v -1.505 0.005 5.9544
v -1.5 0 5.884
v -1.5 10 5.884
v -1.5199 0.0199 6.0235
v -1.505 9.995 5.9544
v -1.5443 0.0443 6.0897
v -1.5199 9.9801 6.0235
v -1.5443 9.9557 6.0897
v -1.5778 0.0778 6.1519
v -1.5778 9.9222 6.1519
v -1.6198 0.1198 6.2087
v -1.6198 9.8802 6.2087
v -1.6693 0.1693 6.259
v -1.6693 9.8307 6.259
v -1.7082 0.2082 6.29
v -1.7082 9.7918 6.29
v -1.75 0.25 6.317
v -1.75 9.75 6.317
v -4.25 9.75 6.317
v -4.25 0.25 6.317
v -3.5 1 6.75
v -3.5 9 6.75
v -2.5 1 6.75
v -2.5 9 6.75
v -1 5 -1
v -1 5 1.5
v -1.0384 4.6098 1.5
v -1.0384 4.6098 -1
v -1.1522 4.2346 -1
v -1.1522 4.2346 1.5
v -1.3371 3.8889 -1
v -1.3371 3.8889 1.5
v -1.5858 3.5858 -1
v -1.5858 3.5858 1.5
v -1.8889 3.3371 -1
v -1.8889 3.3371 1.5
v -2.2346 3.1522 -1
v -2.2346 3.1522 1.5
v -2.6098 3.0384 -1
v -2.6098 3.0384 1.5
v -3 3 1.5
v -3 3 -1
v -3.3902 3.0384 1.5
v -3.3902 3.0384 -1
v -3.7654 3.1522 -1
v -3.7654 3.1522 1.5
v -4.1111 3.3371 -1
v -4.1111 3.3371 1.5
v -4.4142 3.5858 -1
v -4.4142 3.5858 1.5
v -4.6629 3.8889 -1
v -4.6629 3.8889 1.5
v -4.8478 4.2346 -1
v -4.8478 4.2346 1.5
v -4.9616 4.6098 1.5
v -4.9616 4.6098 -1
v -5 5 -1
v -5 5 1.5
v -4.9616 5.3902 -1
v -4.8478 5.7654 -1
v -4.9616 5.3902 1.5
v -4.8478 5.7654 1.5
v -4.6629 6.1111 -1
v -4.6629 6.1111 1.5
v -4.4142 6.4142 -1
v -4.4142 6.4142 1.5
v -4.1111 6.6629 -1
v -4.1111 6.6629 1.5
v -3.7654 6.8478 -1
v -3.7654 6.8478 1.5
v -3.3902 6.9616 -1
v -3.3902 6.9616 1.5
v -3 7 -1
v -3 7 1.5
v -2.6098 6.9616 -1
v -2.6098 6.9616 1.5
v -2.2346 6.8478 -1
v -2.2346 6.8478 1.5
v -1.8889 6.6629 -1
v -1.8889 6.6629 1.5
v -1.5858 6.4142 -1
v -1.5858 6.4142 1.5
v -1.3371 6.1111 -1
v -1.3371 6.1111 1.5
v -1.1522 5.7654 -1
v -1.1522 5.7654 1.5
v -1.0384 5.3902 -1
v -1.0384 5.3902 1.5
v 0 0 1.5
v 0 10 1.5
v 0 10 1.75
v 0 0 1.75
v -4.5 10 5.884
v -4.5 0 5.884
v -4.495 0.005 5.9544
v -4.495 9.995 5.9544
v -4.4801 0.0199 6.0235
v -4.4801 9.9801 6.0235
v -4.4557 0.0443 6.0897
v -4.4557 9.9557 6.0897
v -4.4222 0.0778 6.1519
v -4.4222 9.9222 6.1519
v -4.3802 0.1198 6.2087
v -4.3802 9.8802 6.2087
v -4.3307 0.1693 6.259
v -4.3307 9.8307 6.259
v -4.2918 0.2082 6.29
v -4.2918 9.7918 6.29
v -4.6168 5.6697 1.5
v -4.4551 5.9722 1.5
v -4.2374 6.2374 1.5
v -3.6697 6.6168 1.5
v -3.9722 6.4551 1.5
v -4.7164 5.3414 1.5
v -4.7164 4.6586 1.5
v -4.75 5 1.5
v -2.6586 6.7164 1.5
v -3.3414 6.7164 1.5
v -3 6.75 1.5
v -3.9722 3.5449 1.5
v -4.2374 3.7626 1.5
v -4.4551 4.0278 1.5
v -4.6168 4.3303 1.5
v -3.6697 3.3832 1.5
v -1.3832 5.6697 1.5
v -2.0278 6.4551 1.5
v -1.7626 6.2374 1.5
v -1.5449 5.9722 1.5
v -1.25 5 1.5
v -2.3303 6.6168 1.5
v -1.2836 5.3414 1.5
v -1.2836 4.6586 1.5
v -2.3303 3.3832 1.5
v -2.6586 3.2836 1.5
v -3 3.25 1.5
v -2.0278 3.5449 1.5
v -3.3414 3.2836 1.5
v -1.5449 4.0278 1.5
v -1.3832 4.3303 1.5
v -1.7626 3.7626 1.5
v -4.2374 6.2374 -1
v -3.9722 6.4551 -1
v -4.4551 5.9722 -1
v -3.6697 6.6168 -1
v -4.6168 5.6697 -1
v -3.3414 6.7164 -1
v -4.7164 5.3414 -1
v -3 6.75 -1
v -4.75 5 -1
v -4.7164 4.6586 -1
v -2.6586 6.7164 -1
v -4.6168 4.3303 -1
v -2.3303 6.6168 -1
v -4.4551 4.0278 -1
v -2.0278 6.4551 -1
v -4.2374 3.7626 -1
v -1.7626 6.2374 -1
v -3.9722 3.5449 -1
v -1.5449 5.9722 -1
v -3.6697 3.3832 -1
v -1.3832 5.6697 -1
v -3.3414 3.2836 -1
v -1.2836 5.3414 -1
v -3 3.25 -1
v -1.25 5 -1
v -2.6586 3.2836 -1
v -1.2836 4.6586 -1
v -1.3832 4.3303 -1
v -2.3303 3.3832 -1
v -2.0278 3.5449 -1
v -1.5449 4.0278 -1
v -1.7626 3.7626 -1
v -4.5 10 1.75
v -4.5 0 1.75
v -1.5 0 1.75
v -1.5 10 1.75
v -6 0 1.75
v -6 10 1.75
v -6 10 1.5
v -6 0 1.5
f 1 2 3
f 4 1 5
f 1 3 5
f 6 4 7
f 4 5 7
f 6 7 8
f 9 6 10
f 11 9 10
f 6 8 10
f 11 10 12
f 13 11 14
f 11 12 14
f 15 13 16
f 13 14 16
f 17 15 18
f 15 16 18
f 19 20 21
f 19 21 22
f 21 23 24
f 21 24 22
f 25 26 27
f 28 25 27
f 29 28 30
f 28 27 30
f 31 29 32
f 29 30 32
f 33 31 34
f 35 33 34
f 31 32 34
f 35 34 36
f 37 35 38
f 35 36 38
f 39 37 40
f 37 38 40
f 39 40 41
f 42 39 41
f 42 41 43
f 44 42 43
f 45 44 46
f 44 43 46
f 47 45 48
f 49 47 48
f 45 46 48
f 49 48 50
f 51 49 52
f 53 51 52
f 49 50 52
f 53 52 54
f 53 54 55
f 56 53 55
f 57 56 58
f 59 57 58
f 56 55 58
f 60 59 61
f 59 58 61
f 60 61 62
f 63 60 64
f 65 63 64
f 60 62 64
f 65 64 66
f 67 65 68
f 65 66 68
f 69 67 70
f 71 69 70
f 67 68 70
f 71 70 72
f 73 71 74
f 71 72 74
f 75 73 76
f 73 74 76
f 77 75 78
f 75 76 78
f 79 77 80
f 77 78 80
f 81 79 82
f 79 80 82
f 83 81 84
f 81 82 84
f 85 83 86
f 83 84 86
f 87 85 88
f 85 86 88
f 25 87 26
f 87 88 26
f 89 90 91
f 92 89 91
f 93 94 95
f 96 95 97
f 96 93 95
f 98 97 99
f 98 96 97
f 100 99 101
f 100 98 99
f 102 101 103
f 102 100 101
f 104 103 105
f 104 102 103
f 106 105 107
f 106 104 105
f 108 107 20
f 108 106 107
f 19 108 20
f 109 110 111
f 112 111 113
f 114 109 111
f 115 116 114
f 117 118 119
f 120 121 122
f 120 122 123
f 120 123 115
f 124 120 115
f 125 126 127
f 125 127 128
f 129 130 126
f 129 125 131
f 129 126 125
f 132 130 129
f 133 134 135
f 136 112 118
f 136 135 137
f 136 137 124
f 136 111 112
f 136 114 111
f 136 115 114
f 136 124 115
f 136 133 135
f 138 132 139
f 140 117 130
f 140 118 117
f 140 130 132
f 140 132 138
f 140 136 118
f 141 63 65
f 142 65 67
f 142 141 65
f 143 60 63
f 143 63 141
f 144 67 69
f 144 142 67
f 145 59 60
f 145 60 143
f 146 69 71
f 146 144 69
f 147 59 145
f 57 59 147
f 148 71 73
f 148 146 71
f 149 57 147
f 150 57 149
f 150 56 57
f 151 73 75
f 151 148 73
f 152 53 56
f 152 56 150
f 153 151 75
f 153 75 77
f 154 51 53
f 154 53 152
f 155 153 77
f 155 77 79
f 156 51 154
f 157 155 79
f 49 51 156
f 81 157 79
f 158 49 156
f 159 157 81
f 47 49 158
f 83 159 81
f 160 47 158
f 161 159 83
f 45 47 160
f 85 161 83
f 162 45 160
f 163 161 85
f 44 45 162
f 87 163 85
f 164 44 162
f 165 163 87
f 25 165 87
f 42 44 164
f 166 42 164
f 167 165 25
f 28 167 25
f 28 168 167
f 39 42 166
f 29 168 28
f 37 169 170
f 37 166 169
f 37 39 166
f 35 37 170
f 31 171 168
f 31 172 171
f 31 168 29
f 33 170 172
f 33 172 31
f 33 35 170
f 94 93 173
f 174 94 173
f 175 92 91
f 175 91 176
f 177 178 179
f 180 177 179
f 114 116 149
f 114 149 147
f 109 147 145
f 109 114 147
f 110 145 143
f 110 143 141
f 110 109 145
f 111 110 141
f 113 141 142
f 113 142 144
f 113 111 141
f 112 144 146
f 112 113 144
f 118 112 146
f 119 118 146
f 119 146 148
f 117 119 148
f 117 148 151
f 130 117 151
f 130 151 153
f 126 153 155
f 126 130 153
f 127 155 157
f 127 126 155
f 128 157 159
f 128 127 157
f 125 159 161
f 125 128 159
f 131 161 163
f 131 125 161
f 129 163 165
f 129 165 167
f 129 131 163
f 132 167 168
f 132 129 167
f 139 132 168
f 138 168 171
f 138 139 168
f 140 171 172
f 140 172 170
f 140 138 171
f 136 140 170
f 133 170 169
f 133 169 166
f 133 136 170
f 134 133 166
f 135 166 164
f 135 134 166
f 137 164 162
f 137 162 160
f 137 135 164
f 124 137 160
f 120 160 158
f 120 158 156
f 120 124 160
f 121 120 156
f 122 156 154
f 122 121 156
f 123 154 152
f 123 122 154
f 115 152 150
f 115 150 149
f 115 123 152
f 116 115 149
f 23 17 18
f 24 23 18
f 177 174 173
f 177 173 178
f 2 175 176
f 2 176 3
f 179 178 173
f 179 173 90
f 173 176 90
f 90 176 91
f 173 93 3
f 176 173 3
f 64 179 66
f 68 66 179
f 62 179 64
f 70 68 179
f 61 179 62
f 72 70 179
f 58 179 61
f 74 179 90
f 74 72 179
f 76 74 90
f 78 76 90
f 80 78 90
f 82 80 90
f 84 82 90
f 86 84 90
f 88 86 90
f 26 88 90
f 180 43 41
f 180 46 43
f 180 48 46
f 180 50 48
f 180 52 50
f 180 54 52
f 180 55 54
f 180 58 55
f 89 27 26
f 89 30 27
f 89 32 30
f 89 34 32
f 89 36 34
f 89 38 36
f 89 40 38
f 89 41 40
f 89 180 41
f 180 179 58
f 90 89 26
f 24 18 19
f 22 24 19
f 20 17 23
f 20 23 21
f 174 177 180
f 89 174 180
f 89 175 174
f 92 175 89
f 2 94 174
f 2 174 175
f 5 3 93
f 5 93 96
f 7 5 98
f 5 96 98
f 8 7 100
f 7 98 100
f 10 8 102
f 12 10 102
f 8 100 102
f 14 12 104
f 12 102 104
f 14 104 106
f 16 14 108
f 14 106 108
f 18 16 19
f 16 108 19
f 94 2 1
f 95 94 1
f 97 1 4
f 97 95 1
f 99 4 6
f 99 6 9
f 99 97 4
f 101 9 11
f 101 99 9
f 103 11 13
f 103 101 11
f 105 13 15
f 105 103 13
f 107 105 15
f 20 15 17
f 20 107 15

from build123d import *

# Parameters (mm, degrees)
BOSS_EXTRUDE1_DEPTH = 10
CHAMFER4_SIZE       = 1
CHAMFER4_SIZE2      = 0.577350269
FILLET3_R           = 0.5
SKETCH3_R           = 2
SKETCH3_R_2         = 1.75
BOSS_EXTRUDE3_DEPTH = 2.5


with BuildPart() as part:
    # Sketch1 → Boss-Extrude1 (new body)
    with BuildSketch(Plane(origin=(0, 0, 0), x_dir=(-1, 0, 0), z_dir=(0, 1, 0))):
        Polygon((0, 1.5), (0, 1.75), (1.5, 1.75), (1.5, 6.75), (4.5, 6.75), (4.5, 1.75), (6, 1.75), (6, 1.5), align=None)
    extrude(amount=BOSS_EXTRUDE1_DEPTH)

    # Chamfer4
    chamfer4_edges = [part.edges().sort_by_distance(p)[0] for p in [
        (-1.5, 5, 6.75),
        (-4.5, 5, 6.75),
        (-3, 10, 6.75),
        (-3, 0, 6.75),
    ]]
    chamfer4_side = [part.faces().sort_by_distance(p)[0] for p in [
        (-3, 5, 6.75),
    ]]
    chamfer(chamfer4_edges, length=CHAMFER4_SIZE, length2=CHAMFER4_SIZE2, reference=chamfer4_side[0])

    # Fillet3
    fillet3_edges = [part.edges().sort_by_distance(p)[0] for p in [
        (-4.5, 5, 6.172649731),
        (-3, 10, 6.172649731),
        (-1.5, 5, 6.172649731),
        (-3, 0, 6.172649731),
    ]]
    fillet(fillet3_edges, radius=FILLET3_R)

    # Sketch3 → Boss-Extrude3 (add)
    with BuildSketch(Plane(origin=(0, 0, 1.5), x_dir=(1, 0, 0), z_dir=(0, 0, -1))):
        with Locations((-3, -5)):
            Circle(SKETCH3_R)
        with Locations(Location((-3, -5, 0), (0, 0, 180))):
            Circle(SKETCH3_R_2, mode=Mode.SUBTRACT)
    extrude(amount=BOSS_EXTRUDE3_DEPTH)


solid = part.part
